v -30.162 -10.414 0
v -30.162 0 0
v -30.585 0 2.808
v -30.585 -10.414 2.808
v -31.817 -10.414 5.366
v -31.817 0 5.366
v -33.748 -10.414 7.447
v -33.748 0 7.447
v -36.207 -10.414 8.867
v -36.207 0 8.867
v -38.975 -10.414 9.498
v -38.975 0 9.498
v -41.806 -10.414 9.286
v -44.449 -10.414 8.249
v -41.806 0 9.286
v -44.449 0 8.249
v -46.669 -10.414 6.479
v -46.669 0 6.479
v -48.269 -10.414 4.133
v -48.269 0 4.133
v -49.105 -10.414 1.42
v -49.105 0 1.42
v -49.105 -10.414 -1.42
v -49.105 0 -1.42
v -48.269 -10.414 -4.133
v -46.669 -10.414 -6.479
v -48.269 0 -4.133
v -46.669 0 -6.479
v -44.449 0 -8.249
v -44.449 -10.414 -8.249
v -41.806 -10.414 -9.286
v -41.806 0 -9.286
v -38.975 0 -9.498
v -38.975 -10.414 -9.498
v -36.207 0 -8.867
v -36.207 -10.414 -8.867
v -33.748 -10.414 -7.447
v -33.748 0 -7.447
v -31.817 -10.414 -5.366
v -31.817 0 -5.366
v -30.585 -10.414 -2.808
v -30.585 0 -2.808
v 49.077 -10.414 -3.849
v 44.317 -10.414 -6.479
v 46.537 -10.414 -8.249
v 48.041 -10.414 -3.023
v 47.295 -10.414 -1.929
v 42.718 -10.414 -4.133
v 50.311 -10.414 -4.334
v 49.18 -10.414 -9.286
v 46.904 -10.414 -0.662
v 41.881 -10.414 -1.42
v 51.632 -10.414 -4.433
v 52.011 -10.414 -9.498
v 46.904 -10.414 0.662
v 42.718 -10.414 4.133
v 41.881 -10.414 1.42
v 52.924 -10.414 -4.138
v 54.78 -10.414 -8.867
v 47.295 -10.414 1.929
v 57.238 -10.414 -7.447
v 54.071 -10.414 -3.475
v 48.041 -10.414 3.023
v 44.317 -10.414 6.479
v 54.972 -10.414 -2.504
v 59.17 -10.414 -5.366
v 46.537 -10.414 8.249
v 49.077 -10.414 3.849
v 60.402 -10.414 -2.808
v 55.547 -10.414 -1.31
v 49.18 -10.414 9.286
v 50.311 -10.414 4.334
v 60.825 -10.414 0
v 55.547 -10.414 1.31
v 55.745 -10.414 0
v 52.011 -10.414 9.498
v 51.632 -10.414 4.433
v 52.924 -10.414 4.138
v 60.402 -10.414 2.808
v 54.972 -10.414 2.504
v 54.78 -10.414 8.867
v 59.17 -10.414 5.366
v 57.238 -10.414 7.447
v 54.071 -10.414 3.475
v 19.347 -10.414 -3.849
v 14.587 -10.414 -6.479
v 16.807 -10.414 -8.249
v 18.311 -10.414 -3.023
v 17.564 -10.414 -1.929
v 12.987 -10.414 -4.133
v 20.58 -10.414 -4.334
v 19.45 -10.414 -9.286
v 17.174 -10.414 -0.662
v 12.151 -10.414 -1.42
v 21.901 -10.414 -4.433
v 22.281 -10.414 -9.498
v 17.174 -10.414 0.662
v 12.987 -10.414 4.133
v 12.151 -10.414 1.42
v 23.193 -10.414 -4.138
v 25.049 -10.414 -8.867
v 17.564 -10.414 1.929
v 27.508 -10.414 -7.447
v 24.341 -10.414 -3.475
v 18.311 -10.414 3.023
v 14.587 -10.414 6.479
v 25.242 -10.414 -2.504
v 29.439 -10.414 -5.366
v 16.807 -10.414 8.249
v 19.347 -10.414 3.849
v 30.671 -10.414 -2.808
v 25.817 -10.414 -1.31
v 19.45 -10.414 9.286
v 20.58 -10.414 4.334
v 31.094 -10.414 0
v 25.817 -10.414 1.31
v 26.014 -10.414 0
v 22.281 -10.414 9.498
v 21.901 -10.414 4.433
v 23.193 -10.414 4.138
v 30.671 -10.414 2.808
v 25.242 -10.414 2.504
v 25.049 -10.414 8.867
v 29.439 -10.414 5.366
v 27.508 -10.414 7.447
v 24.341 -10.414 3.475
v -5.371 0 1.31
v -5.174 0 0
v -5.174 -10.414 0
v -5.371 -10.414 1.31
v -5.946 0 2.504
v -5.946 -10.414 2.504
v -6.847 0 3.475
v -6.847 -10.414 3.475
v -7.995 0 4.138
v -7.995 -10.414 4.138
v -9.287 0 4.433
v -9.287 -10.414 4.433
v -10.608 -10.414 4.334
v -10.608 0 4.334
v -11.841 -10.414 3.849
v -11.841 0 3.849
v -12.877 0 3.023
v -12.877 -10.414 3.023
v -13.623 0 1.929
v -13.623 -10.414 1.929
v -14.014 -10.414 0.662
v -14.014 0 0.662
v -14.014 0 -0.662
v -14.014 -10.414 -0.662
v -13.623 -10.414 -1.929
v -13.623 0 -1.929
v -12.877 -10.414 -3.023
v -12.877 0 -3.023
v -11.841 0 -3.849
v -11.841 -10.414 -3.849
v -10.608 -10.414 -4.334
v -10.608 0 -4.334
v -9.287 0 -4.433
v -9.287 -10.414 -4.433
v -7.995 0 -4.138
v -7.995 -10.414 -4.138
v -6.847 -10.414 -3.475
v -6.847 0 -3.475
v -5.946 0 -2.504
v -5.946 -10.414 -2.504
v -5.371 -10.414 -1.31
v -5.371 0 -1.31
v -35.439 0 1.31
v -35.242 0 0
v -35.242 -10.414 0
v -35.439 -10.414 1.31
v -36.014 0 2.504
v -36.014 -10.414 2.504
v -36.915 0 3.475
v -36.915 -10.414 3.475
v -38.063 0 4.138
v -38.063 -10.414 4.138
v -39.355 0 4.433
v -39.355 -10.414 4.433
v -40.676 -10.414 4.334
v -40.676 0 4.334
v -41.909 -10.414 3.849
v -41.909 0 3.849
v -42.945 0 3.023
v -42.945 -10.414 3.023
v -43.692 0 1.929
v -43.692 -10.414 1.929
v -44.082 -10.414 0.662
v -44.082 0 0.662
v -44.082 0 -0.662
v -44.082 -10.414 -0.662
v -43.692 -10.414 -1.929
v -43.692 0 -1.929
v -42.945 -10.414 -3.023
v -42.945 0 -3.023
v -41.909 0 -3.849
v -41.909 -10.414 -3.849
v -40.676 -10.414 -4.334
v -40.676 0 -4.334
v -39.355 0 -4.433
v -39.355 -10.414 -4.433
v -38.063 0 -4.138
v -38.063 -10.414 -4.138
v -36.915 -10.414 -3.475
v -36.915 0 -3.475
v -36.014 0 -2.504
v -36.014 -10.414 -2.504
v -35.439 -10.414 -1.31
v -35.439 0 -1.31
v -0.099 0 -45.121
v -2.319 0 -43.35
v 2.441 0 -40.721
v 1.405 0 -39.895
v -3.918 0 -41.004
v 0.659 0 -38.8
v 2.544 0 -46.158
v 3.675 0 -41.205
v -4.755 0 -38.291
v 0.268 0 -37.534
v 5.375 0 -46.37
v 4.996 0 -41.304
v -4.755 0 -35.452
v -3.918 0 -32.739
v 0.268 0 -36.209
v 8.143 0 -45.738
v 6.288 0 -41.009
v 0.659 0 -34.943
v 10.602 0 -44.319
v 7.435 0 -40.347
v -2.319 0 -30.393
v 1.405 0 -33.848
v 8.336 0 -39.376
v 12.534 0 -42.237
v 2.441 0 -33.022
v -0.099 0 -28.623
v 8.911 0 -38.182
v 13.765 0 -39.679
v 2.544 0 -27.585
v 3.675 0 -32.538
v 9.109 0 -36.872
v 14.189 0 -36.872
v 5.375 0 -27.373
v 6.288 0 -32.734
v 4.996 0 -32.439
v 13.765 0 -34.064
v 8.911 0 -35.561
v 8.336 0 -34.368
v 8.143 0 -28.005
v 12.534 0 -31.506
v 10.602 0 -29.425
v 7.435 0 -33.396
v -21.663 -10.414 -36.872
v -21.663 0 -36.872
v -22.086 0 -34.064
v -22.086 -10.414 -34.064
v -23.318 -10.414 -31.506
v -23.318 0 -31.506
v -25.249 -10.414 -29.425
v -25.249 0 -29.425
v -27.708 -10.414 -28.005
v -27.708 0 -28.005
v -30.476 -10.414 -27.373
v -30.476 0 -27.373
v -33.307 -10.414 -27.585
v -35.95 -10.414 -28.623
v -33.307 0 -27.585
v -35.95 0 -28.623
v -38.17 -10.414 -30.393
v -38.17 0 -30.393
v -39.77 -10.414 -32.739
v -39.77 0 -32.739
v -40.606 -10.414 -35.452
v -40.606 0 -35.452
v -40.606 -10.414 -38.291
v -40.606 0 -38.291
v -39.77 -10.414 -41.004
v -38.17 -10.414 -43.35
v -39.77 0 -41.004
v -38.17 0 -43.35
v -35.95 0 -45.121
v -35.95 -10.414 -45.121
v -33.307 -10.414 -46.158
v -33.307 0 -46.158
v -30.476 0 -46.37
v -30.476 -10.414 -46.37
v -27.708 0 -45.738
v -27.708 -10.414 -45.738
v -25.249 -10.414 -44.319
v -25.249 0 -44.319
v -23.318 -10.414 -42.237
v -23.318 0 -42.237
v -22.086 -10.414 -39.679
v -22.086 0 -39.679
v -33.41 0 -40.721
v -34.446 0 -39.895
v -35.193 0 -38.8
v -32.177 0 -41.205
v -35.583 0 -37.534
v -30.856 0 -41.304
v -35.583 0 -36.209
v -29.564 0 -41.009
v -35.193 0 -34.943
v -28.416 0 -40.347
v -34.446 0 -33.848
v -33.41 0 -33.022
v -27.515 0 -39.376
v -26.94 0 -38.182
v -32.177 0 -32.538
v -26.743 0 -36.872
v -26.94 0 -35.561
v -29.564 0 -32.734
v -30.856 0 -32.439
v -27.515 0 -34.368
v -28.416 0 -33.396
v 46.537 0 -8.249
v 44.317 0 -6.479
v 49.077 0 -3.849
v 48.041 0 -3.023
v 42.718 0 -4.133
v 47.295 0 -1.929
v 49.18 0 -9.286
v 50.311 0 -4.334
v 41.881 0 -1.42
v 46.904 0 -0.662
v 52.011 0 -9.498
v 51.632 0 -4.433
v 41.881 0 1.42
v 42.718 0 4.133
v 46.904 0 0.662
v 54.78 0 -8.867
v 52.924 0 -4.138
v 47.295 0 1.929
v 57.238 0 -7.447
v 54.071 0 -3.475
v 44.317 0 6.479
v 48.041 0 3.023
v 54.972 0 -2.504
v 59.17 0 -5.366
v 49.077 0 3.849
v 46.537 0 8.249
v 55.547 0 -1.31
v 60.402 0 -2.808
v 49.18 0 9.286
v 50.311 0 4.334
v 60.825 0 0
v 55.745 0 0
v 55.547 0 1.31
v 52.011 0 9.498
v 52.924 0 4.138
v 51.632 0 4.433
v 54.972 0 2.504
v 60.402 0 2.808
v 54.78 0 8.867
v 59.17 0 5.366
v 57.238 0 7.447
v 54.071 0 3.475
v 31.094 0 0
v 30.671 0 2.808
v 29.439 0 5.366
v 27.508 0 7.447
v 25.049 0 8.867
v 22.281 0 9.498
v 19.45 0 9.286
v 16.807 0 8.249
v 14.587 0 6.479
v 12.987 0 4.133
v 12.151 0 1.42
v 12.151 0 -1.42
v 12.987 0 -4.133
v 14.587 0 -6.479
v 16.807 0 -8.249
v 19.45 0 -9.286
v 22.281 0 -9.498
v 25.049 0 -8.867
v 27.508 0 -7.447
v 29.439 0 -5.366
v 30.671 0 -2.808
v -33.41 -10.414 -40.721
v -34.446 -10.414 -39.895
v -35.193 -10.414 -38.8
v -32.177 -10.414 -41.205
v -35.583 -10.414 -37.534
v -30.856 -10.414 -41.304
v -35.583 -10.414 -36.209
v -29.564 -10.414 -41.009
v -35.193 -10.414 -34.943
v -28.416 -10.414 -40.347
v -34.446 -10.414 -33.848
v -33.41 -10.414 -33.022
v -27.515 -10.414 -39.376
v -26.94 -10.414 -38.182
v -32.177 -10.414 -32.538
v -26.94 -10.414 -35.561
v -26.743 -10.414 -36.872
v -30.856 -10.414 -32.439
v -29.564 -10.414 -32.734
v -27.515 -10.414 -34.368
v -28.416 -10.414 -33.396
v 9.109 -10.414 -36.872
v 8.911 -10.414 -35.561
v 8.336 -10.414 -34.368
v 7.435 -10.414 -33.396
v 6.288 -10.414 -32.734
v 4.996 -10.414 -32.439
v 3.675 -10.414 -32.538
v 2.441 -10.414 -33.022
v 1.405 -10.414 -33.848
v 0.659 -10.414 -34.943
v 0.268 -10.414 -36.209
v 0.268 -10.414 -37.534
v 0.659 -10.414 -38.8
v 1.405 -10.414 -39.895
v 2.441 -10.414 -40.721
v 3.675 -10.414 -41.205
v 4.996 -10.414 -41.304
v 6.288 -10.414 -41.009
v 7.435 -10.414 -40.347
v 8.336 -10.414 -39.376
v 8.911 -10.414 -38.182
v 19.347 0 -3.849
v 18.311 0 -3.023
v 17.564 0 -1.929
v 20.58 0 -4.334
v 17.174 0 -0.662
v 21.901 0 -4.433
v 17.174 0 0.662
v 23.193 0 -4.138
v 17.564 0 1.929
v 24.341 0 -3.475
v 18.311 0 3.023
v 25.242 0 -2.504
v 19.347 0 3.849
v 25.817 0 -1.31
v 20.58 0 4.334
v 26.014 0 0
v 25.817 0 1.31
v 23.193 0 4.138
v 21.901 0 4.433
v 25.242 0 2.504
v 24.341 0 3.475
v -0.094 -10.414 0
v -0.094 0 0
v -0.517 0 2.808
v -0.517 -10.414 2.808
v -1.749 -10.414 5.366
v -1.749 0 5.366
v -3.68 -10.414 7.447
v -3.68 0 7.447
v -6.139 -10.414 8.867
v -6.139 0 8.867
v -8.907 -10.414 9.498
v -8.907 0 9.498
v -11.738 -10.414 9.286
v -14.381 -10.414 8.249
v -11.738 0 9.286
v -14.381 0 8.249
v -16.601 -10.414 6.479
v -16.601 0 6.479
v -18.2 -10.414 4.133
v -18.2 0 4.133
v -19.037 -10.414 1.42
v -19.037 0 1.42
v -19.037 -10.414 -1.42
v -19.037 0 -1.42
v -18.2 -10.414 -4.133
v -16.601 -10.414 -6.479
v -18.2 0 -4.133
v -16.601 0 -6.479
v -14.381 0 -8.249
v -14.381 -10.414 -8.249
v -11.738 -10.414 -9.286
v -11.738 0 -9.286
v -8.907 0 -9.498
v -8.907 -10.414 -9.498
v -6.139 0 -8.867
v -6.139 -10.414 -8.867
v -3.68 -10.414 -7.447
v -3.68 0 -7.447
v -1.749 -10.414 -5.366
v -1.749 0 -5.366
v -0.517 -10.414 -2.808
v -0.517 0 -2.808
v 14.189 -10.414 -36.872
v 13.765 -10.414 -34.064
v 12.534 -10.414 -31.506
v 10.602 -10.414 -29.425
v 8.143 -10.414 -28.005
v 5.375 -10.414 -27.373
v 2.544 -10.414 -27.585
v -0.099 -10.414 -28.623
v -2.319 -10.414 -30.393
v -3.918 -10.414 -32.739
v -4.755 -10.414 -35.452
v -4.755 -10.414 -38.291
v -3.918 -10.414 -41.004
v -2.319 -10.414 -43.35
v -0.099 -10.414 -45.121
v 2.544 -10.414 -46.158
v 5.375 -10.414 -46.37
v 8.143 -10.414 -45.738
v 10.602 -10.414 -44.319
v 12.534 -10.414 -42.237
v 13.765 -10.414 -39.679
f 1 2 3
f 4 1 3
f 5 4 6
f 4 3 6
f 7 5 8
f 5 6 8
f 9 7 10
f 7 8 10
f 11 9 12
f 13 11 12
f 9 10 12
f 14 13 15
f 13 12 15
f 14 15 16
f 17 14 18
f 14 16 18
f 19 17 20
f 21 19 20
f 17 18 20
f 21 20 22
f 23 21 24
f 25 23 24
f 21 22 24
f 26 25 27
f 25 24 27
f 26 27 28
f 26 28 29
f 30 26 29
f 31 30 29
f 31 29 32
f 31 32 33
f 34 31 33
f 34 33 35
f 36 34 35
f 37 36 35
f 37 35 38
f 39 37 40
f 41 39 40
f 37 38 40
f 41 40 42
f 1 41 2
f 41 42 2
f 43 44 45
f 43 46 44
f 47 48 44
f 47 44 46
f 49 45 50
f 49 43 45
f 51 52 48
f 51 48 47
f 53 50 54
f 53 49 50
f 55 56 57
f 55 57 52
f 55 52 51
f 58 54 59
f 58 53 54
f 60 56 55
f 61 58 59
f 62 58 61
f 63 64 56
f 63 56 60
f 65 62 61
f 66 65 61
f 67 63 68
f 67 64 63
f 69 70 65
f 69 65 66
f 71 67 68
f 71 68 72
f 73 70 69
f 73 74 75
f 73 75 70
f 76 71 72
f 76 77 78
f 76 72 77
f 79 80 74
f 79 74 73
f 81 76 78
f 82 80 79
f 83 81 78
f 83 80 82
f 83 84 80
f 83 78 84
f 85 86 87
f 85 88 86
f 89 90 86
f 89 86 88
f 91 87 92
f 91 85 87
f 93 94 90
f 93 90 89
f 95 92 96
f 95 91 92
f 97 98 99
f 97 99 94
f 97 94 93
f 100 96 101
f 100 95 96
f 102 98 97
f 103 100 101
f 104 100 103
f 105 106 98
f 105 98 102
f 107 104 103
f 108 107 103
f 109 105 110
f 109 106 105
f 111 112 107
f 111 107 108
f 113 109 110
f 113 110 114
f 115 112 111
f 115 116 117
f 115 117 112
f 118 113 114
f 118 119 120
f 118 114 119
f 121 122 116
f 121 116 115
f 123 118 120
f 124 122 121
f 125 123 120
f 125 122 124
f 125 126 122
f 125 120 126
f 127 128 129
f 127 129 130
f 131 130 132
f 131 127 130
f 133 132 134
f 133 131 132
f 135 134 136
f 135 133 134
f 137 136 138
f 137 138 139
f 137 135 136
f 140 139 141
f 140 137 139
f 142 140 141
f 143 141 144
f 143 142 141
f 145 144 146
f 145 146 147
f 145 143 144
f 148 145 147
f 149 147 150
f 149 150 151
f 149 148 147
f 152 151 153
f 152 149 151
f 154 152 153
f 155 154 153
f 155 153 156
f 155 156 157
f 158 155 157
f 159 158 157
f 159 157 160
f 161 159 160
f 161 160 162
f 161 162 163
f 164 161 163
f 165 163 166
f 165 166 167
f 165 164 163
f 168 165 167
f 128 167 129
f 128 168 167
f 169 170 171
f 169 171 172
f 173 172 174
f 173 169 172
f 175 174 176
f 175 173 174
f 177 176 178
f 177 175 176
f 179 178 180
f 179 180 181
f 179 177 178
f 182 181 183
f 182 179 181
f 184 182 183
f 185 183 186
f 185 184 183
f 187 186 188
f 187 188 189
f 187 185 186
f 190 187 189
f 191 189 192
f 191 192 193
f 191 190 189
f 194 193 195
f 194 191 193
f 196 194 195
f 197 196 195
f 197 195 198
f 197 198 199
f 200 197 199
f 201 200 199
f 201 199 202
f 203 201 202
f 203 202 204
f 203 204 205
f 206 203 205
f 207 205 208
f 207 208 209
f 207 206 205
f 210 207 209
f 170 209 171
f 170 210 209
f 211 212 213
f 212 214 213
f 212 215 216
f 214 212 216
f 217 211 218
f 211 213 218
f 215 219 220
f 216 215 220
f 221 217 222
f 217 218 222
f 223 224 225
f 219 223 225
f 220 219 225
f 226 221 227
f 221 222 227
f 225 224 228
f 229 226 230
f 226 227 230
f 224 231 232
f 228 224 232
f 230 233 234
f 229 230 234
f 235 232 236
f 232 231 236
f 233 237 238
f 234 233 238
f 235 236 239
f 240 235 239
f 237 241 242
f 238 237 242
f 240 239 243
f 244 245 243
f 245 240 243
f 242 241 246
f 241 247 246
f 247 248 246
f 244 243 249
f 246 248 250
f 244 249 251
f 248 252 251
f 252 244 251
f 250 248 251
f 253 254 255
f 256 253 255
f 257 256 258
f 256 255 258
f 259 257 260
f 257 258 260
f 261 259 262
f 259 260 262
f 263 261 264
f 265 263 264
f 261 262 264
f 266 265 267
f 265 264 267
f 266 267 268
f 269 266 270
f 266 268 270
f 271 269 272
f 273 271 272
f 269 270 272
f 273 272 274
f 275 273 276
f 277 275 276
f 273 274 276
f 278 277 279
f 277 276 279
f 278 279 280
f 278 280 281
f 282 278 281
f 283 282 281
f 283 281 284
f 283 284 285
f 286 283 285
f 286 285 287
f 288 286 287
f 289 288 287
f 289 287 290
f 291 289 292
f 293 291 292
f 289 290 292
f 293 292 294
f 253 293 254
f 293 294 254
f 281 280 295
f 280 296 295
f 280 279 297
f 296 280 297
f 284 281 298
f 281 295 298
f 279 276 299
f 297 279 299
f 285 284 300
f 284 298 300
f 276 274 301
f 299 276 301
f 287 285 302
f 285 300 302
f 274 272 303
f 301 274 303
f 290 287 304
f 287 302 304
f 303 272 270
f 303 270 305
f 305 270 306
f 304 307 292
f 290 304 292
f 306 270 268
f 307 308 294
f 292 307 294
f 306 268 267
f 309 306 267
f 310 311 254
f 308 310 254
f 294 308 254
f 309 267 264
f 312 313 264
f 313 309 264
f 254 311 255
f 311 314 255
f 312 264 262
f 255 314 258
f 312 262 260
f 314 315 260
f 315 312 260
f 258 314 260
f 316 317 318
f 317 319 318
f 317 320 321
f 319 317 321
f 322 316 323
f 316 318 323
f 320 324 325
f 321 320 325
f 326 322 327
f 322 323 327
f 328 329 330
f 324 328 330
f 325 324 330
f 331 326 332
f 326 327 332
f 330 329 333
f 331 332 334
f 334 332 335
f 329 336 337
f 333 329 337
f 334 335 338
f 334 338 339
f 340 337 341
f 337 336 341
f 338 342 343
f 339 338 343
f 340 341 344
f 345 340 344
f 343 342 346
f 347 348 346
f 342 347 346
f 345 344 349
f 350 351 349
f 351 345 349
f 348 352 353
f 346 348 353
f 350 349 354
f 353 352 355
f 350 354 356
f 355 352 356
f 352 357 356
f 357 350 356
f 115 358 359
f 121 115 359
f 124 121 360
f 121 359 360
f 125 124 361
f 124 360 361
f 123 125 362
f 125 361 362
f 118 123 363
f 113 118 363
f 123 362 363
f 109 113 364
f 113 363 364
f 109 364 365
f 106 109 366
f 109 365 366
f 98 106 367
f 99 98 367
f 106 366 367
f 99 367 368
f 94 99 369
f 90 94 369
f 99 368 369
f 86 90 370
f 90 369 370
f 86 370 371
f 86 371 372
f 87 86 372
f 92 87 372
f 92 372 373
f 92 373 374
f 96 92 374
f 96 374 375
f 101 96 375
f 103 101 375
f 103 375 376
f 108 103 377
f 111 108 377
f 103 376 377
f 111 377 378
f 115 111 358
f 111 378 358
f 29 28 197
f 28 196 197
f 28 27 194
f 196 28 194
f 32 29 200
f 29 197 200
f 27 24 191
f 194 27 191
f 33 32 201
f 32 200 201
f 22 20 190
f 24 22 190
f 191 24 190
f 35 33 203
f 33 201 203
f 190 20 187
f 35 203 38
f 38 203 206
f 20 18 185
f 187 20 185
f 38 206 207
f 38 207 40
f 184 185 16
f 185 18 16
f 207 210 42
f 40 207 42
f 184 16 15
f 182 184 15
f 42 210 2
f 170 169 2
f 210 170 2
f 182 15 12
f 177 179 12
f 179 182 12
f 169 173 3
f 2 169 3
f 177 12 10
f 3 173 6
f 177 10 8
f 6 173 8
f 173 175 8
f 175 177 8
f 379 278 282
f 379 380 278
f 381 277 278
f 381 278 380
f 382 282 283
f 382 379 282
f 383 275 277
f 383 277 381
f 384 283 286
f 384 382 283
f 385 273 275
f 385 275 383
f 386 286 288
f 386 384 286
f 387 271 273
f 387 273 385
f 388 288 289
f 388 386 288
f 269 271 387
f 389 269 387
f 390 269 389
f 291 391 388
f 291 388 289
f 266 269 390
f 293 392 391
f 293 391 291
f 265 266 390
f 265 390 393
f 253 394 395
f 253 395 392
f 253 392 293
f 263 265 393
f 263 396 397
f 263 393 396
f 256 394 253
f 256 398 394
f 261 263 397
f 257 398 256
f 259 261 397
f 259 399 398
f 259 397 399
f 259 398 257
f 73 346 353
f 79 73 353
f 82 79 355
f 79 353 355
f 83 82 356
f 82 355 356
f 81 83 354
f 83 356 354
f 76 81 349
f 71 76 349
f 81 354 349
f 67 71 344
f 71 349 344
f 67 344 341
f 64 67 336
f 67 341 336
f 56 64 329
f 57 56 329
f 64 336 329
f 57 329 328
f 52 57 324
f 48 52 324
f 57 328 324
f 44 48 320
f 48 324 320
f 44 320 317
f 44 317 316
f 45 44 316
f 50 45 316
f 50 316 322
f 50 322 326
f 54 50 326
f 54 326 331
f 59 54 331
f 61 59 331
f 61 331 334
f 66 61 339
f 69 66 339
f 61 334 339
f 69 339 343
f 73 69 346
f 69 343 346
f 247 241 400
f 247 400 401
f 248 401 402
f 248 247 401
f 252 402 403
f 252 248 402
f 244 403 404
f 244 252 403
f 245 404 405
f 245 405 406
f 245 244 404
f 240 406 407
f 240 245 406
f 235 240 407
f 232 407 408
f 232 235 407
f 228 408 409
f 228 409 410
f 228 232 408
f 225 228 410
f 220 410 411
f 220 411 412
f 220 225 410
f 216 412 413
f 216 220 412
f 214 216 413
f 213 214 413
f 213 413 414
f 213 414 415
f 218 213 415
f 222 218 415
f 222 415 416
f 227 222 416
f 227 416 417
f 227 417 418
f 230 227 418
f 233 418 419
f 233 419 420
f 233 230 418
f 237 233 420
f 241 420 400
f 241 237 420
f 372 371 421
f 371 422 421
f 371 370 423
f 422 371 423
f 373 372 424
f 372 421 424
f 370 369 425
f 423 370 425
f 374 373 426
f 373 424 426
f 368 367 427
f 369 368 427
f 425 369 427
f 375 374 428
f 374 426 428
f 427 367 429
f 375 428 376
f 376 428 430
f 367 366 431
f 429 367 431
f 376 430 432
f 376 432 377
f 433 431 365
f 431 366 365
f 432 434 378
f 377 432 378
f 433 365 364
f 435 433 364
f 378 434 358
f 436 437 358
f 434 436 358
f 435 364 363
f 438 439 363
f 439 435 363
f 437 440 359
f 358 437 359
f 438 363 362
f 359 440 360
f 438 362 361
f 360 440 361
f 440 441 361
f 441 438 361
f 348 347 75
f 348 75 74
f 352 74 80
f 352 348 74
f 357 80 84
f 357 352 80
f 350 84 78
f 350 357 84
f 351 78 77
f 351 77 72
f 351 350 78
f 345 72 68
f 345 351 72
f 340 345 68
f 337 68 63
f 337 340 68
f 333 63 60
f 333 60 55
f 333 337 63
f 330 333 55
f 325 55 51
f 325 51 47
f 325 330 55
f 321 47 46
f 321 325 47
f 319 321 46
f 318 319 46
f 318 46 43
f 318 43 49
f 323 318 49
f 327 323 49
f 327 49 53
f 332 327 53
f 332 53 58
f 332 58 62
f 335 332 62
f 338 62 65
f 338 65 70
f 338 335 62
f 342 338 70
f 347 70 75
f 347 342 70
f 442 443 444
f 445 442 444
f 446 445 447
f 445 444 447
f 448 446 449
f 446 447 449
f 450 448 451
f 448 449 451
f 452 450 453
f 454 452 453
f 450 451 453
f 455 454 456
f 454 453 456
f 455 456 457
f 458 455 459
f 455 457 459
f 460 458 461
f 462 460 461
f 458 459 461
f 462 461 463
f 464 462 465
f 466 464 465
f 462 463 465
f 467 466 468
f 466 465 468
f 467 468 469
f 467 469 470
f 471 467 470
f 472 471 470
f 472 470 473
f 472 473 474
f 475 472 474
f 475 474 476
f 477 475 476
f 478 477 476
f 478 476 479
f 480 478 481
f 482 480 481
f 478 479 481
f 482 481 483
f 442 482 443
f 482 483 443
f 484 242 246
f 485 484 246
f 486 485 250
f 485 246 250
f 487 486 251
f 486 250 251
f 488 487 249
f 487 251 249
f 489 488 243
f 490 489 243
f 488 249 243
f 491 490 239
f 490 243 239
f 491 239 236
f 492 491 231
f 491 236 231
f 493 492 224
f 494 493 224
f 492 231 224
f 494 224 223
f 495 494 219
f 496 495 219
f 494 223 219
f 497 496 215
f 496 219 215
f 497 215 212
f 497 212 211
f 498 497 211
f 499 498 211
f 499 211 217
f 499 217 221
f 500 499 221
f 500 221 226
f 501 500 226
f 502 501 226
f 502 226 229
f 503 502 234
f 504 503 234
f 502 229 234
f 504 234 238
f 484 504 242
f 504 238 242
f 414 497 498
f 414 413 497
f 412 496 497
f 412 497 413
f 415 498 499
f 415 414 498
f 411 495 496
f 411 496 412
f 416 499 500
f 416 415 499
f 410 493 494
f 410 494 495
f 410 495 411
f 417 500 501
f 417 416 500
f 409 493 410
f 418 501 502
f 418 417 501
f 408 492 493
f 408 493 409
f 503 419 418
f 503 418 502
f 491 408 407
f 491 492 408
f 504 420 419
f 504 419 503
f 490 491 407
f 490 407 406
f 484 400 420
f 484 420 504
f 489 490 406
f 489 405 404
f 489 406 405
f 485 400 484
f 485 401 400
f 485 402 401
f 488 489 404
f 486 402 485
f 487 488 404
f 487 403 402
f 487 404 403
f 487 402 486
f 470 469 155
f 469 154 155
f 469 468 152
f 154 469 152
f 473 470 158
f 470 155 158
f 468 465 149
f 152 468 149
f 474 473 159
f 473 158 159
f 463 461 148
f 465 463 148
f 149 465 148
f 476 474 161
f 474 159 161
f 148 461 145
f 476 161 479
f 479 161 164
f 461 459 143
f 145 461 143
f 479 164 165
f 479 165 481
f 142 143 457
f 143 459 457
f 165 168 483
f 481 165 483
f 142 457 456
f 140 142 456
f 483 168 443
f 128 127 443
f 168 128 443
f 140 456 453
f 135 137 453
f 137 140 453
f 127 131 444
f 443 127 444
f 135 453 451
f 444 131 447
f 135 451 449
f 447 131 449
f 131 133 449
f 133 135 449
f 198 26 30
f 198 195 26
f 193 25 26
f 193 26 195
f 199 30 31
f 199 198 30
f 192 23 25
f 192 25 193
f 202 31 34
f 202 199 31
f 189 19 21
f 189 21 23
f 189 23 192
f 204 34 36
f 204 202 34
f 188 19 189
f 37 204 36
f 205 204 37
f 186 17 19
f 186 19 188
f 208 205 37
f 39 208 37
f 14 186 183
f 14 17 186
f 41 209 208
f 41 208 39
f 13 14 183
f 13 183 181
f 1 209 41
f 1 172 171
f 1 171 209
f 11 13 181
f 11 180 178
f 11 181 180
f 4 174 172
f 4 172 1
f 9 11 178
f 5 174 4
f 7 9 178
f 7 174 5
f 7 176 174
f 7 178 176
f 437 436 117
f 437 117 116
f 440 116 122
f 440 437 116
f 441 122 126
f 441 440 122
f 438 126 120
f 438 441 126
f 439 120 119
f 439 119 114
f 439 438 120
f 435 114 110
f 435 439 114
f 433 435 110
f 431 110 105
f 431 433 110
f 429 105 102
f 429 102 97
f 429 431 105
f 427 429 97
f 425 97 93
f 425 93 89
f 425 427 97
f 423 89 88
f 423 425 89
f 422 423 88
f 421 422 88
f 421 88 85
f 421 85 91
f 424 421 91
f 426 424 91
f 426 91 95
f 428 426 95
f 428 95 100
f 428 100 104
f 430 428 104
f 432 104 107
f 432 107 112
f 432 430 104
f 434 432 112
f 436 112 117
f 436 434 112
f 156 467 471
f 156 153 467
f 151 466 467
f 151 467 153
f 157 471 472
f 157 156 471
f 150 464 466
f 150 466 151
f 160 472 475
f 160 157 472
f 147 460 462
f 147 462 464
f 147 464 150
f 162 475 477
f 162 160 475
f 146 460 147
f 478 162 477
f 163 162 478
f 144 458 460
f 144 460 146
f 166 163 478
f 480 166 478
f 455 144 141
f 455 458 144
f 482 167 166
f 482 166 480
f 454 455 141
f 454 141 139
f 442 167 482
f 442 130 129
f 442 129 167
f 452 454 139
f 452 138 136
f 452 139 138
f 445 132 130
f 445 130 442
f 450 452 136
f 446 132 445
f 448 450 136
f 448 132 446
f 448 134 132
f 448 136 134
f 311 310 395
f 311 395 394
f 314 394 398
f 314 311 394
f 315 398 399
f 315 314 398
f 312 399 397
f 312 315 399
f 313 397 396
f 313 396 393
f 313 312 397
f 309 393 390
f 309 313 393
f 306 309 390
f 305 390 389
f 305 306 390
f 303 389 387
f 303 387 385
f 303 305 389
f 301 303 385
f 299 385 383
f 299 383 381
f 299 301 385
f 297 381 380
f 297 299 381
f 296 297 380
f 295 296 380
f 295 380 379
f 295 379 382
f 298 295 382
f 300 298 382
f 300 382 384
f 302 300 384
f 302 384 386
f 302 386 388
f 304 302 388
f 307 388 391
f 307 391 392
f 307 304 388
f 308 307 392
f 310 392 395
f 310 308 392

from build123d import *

# Parameters (mm, degrees)
F0_R     = 9.525
F0_R_2   = 4.445
F1_DEPTH = 10.414


with BuildPart() as f1:
    # F0 (on Front) → F1 (new body)
    with BuildSketch(Plane.XZ):
        with Locations((-39.686805, 0)):
            Circle(F0_R)
        with Locations((-39.686805, 0)):
            Circle(F0_R_2, mode=Mode.SUBTRACT)
        with Locations((-9.618689, 0)):
            Circle(F0_R)
        with Locations((-9.618689, 0)):
            Circle(F0_R_2, mode=Mode.SUBTRACT)
        with Locations((21.569181, 0)):
            Circle(F0_R)
        with Locations((21.569181, 0)):
            Circle(F0_R_2, mode=Mode.SUBTRACT)
        with Locations((51.299673, 0)):
            Circle(F0_R)
        with Locations((51.299673, 0)):
            Circle(F0_R_2, mode=Mode.SUBTRACT)
        with Locations((-31.18787, -36.871642)):
            Circle(F0_R)
        with Locations((-31.18787, -36.871642)):
            Circle(F0_R_2, mode=Mode.SUBTRACT)
        with Locations((4.663608, -36.871642)):
            Circle(F0_R)
        with Locations((4.663608, -36.871642)):
            Circle(F0_R_2, mode=Mode.SUBTRACT)
    extrude(amount=F1_DEPTH)


solid = f1.part
